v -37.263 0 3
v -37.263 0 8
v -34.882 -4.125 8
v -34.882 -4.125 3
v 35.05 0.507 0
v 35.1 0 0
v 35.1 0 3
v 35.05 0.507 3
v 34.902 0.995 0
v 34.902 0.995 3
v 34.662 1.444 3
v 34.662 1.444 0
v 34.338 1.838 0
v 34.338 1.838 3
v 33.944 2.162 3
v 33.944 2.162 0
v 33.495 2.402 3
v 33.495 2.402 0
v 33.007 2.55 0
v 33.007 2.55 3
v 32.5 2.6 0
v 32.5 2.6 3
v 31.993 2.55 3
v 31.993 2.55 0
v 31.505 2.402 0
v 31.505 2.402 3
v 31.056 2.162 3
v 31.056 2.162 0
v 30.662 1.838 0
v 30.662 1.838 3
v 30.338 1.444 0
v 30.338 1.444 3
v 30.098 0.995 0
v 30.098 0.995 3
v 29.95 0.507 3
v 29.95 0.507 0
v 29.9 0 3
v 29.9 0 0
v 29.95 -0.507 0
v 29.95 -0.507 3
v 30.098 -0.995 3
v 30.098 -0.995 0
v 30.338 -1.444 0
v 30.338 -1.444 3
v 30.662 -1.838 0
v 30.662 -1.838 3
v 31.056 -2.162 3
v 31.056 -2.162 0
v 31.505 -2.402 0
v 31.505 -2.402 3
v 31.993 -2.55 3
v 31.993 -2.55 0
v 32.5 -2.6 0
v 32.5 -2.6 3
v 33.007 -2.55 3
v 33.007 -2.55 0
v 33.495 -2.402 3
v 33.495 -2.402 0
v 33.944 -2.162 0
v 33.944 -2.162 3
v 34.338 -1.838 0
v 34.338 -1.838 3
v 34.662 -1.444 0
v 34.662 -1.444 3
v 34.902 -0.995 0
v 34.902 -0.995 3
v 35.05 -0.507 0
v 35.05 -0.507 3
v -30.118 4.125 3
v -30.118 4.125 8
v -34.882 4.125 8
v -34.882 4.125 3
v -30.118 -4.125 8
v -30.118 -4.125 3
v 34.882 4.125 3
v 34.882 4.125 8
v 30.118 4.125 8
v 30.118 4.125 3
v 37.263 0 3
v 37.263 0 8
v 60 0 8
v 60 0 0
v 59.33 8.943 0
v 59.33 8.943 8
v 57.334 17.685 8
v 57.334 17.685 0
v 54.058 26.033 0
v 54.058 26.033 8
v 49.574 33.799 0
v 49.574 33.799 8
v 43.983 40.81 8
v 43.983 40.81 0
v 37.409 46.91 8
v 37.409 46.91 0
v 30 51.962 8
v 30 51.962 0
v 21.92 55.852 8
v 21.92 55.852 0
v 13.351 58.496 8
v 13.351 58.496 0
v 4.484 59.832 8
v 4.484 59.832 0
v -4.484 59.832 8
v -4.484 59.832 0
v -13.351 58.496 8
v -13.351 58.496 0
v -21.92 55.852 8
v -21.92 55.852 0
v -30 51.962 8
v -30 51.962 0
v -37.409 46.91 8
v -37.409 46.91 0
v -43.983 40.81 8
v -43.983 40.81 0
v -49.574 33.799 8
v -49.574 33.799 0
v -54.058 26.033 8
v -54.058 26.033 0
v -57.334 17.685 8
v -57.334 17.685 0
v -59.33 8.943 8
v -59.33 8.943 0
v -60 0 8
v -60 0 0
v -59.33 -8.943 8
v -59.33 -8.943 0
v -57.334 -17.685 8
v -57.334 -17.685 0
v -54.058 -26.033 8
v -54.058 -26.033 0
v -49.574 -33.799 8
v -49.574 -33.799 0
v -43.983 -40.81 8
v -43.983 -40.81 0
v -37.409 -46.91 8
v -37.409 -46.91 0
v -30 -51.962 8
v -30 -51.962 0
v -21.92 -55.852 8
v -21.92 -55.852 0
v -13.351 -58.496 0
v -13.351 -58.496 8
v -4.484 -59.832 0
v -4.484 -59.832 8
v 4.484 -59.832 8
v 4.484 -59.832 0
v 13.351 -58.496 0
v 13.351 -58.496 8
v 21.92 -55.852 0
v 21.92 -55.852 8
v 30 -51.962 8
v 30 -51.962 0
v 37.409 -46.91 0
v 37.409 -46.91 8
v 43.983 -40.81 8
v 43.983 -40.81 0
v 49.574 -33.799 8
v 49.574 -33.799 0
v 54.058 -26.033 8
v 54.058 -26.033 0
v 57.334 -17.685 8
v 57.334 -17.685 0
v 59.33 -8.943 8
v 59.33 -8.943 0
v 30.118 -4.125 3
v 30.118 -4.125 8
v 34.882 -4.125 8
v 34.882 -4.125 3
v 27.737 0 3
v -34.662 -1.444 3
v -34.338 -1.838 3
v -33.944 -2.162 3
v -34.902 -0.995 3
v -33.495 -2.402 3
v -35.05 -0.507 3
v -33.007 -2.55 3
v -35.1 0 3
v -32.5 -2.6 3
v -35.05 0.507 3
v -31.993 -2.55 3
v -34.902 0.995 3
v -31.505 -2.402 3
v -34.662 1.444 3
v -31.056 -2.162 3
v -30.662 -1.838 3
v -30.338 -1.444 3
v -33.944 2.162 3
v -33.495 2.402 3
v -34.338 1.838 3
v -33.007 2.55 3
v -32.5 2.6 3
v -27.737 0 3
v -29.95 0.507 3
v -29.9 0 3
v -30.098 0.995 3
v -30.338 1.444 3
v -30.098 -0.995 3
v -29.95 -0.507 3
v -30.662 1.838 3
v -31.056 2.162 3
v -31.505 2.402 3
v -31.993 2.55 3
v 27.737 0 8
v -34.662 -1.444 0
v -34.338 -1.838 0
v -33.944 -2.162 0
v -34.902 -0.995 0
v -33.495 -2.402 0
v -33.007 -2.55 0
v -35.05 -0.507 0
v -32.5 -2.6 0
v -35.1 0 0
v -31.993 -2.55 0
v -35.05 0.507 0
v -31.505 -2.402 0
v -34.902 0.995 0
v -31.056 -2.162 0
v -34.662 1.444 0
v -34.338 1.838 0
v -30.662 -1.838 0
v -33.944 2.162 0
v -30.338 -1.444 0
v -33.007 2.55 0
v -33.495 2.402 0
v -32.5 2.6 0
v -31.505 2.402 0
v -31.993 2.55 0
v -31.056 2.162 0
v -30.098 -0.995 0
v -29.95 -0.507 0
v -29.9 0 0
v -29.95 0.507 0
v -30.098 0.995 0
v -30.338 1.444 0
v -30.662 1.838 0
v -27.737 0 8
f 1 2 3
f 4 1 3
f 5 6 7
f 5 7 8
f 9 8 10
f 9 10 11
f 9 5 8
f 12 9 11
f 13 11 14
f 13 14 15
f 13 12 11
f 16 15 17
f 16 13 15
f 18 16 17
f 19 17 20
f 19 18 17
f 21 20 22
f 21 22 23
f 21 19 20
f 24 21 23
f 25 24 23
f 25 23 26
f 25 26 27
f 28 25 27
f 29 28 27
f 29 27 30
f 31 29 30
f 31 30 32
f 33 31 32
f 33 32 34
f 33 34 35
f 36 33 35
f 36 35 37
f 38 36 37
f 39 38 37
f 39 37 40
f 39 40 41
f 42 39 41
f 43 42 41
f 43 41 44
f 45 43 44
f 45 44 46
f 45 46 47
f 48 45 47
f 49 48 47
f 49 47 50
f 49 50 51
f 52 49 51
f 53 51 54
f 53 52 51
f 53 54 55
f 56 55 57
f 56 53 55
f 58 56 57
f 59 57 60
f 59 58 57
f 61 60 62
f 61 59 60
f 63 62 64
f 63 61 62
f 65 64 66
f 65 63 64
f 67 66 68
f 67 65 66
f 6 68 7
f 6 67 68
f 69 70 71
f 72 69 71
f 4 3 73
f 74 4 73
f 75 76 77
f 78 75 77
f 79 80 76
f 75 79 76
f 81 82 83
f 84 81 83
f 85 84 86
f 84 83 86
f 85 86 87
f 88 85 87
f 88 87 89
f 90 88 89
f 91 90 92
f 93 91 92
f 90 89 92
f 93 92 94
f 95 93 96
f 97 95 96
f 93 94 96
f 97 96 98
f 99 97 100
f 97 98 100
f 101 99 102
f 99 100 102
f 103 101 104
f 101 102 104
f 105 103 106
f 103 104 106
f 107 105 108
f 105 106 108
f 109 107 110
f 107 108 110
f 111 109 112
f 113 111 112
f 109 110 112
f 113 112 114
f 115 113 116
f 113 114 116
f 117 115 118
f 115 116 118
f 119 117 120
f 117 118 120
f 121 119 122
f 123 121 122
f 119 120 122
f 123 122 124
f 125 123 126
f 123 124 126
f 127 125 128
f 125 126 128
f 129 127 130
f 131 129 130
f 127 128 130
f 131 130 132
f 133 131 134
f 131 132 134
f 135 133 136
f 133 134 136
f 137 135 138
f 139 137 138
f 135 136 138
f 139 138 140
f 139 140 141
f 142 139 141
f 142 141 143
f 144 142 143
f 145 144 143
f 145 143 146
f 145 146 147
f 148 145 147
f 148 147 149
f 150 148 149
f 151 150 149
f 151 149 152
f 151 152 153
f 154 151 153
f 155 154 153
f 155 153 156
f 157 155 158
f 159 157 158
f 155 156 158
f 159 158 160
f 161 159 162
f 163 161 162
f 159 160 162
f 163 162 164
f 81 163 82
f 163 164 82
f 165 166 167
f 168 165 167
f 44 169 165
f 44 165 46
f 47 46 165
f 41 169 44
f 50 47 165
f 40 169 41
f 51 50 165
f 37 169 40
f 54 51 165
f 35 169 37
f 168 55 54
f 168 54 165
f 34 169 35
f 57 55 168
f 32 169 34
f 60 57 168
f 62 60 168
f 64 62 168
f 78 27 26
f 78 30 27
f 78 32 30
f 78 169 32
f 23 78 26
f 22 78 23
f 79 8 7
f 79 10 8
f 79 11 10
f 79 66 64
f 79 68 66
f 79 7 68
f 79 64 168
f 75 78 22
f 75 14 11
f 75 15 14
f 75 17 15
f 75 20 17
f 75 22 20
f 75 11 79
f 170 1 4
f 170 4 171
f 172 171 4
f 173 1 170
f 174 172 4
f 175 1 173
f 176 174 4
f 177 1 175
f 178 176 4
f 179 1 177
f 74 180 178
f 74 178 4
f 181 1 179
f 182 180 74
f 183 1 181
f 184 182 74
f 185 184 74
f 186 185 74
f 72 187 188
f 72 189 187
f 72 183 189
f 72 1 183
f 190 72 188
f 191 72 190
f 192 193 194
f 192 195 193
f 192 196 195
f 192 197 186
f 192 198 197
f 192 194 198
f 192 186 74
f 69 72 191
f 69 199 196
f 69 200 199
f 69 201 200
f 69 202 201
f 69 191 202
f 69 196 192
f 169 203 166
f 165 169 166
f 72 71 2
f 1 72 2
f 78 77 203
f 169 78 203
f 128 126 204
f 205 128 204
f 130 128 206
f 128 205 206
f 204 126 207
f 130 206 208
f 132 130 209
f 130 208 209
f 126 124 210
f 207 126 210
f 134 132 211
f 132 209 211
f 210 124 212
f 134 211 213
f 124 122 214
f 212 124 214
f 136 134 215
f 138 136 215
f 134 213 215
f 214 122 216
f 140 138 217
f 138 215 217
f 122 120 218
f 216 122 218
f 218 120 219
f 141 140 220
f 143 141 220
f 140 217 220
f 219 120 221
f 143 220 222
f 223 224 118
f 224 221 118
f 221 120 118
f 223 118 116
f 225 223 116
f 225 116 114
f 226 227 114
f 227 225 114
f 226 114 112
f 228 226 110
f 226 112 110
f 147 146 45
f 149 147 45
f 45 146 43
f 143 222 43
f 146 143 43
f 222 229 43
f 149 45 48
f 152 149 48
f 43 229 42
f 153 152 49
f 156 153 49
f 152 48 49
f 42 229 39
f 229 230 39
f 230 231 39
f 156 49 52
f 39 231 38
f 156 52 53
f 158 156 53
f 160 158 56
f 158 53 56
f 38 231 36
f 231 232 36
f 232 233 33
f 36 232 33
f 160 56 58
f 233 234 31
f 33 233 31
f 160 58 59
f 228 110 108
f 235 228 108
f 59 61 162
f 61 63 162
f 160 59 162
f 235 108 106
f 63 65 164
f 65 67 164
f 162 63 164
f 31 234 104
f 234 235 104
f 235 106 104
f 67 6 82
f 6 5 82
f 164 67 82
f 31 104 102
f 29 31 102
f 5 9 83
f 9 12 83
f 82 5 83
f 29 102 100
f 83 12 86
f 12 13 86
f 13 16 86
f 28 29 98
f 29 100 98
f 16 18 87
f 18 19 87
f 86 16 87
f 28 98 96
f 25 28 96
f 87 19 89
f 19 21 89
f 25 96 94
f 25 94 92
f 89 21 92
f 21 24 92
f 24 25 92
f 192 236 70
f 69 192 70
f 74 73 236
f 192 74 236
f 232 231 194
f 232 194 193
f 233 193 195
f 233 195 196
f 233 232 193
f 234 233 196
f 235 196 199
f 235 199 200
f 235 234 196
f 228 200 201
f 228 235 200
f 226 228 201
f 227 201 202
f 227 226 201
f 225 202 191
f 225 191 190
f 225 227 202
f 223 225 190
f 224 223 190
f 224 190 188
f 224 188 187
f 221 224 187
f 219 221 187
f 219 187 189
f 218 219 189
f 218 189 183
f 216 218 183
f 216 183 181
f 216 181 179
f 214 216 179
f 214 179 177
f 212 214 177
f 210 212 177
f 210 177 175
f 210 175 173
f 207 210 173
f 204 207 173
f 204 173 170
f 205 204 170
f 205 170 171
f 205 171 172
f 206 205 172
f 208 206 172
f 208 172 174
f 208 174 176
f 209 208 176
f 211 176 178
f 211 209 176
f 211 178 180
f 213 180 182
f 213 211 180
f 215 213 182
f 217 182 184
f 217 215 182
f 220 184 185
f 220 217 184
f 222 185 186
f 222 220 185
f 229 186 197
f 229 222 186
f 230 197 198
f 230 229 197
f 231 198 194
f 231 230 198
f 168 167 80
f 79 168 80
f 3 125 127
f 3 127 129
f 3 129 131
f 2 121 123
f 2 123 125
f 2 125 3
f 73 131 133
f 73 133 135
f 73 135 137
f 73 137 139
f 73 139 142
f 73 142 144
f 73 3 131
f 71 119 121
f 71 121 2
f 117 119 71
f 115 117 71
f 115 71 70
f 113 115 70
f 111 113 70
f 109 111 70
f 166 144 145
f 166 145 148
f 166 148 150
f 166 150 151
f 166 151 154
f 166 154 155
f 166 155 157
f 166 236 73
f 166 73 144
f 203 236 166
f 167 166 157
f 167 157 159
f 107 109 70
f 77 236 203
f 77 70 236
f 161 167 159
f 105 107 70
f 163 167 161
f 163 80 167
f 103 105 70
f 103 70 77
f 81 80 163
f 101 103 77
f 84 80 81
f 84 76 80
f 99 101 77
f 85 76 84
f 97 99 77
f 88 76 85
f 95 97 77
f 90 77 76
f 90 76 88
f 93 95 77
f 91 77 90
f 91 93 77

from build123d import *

# Parameters (mm, degrees)
F0_R     = 60
F0_R_2   = 2.6
F1_DEPTH = 8
F2_R     = 2.6
F3_DEPTH = 5


with BuildPart() as f1:
    # F0 (on Top) → F1 (new body)
    with BuildSketch(Plane.XY):
        Circle(F0_R)
        with Locations((-32.5, 0)):
            Circle(F0_R_2, mode=Mode.SUBTRACT)
        with Locations((32.5, 0)):
            Circle(F0_R_2, mode=Mode.SUBTRACT)
    extrude(amount=F1_DEPTH)

    # F2 (on face) → F3 (cut)
    with BuildSketch(Plane.XY.offset(8)):
        Polygon((37.26314, 0), (34.88157, 4.125), (30.11843, 4.125), (27.73686, 0), (30.11843, -4.125), (34.88157, -4.125), align=None)
        with Locations((32.5, 0)):
            Circle(F2_R, mode=Mode.SUBTRACT)
        Polygon((-30.11843, 4.125), (-34.88157, 4.125), (-37.26314, 0), (-34.88157, -4.125), (-30.11843, -4.125), (-27.73686, 0), align=None)
        with Locations((-32.5, 0)):
            Circle(F2_R, mode=Mode.SUBTRACT)
    extrude(amount=-F3_DEPTH, mode=Mode.SUBTRACT)


solid = f1.part
